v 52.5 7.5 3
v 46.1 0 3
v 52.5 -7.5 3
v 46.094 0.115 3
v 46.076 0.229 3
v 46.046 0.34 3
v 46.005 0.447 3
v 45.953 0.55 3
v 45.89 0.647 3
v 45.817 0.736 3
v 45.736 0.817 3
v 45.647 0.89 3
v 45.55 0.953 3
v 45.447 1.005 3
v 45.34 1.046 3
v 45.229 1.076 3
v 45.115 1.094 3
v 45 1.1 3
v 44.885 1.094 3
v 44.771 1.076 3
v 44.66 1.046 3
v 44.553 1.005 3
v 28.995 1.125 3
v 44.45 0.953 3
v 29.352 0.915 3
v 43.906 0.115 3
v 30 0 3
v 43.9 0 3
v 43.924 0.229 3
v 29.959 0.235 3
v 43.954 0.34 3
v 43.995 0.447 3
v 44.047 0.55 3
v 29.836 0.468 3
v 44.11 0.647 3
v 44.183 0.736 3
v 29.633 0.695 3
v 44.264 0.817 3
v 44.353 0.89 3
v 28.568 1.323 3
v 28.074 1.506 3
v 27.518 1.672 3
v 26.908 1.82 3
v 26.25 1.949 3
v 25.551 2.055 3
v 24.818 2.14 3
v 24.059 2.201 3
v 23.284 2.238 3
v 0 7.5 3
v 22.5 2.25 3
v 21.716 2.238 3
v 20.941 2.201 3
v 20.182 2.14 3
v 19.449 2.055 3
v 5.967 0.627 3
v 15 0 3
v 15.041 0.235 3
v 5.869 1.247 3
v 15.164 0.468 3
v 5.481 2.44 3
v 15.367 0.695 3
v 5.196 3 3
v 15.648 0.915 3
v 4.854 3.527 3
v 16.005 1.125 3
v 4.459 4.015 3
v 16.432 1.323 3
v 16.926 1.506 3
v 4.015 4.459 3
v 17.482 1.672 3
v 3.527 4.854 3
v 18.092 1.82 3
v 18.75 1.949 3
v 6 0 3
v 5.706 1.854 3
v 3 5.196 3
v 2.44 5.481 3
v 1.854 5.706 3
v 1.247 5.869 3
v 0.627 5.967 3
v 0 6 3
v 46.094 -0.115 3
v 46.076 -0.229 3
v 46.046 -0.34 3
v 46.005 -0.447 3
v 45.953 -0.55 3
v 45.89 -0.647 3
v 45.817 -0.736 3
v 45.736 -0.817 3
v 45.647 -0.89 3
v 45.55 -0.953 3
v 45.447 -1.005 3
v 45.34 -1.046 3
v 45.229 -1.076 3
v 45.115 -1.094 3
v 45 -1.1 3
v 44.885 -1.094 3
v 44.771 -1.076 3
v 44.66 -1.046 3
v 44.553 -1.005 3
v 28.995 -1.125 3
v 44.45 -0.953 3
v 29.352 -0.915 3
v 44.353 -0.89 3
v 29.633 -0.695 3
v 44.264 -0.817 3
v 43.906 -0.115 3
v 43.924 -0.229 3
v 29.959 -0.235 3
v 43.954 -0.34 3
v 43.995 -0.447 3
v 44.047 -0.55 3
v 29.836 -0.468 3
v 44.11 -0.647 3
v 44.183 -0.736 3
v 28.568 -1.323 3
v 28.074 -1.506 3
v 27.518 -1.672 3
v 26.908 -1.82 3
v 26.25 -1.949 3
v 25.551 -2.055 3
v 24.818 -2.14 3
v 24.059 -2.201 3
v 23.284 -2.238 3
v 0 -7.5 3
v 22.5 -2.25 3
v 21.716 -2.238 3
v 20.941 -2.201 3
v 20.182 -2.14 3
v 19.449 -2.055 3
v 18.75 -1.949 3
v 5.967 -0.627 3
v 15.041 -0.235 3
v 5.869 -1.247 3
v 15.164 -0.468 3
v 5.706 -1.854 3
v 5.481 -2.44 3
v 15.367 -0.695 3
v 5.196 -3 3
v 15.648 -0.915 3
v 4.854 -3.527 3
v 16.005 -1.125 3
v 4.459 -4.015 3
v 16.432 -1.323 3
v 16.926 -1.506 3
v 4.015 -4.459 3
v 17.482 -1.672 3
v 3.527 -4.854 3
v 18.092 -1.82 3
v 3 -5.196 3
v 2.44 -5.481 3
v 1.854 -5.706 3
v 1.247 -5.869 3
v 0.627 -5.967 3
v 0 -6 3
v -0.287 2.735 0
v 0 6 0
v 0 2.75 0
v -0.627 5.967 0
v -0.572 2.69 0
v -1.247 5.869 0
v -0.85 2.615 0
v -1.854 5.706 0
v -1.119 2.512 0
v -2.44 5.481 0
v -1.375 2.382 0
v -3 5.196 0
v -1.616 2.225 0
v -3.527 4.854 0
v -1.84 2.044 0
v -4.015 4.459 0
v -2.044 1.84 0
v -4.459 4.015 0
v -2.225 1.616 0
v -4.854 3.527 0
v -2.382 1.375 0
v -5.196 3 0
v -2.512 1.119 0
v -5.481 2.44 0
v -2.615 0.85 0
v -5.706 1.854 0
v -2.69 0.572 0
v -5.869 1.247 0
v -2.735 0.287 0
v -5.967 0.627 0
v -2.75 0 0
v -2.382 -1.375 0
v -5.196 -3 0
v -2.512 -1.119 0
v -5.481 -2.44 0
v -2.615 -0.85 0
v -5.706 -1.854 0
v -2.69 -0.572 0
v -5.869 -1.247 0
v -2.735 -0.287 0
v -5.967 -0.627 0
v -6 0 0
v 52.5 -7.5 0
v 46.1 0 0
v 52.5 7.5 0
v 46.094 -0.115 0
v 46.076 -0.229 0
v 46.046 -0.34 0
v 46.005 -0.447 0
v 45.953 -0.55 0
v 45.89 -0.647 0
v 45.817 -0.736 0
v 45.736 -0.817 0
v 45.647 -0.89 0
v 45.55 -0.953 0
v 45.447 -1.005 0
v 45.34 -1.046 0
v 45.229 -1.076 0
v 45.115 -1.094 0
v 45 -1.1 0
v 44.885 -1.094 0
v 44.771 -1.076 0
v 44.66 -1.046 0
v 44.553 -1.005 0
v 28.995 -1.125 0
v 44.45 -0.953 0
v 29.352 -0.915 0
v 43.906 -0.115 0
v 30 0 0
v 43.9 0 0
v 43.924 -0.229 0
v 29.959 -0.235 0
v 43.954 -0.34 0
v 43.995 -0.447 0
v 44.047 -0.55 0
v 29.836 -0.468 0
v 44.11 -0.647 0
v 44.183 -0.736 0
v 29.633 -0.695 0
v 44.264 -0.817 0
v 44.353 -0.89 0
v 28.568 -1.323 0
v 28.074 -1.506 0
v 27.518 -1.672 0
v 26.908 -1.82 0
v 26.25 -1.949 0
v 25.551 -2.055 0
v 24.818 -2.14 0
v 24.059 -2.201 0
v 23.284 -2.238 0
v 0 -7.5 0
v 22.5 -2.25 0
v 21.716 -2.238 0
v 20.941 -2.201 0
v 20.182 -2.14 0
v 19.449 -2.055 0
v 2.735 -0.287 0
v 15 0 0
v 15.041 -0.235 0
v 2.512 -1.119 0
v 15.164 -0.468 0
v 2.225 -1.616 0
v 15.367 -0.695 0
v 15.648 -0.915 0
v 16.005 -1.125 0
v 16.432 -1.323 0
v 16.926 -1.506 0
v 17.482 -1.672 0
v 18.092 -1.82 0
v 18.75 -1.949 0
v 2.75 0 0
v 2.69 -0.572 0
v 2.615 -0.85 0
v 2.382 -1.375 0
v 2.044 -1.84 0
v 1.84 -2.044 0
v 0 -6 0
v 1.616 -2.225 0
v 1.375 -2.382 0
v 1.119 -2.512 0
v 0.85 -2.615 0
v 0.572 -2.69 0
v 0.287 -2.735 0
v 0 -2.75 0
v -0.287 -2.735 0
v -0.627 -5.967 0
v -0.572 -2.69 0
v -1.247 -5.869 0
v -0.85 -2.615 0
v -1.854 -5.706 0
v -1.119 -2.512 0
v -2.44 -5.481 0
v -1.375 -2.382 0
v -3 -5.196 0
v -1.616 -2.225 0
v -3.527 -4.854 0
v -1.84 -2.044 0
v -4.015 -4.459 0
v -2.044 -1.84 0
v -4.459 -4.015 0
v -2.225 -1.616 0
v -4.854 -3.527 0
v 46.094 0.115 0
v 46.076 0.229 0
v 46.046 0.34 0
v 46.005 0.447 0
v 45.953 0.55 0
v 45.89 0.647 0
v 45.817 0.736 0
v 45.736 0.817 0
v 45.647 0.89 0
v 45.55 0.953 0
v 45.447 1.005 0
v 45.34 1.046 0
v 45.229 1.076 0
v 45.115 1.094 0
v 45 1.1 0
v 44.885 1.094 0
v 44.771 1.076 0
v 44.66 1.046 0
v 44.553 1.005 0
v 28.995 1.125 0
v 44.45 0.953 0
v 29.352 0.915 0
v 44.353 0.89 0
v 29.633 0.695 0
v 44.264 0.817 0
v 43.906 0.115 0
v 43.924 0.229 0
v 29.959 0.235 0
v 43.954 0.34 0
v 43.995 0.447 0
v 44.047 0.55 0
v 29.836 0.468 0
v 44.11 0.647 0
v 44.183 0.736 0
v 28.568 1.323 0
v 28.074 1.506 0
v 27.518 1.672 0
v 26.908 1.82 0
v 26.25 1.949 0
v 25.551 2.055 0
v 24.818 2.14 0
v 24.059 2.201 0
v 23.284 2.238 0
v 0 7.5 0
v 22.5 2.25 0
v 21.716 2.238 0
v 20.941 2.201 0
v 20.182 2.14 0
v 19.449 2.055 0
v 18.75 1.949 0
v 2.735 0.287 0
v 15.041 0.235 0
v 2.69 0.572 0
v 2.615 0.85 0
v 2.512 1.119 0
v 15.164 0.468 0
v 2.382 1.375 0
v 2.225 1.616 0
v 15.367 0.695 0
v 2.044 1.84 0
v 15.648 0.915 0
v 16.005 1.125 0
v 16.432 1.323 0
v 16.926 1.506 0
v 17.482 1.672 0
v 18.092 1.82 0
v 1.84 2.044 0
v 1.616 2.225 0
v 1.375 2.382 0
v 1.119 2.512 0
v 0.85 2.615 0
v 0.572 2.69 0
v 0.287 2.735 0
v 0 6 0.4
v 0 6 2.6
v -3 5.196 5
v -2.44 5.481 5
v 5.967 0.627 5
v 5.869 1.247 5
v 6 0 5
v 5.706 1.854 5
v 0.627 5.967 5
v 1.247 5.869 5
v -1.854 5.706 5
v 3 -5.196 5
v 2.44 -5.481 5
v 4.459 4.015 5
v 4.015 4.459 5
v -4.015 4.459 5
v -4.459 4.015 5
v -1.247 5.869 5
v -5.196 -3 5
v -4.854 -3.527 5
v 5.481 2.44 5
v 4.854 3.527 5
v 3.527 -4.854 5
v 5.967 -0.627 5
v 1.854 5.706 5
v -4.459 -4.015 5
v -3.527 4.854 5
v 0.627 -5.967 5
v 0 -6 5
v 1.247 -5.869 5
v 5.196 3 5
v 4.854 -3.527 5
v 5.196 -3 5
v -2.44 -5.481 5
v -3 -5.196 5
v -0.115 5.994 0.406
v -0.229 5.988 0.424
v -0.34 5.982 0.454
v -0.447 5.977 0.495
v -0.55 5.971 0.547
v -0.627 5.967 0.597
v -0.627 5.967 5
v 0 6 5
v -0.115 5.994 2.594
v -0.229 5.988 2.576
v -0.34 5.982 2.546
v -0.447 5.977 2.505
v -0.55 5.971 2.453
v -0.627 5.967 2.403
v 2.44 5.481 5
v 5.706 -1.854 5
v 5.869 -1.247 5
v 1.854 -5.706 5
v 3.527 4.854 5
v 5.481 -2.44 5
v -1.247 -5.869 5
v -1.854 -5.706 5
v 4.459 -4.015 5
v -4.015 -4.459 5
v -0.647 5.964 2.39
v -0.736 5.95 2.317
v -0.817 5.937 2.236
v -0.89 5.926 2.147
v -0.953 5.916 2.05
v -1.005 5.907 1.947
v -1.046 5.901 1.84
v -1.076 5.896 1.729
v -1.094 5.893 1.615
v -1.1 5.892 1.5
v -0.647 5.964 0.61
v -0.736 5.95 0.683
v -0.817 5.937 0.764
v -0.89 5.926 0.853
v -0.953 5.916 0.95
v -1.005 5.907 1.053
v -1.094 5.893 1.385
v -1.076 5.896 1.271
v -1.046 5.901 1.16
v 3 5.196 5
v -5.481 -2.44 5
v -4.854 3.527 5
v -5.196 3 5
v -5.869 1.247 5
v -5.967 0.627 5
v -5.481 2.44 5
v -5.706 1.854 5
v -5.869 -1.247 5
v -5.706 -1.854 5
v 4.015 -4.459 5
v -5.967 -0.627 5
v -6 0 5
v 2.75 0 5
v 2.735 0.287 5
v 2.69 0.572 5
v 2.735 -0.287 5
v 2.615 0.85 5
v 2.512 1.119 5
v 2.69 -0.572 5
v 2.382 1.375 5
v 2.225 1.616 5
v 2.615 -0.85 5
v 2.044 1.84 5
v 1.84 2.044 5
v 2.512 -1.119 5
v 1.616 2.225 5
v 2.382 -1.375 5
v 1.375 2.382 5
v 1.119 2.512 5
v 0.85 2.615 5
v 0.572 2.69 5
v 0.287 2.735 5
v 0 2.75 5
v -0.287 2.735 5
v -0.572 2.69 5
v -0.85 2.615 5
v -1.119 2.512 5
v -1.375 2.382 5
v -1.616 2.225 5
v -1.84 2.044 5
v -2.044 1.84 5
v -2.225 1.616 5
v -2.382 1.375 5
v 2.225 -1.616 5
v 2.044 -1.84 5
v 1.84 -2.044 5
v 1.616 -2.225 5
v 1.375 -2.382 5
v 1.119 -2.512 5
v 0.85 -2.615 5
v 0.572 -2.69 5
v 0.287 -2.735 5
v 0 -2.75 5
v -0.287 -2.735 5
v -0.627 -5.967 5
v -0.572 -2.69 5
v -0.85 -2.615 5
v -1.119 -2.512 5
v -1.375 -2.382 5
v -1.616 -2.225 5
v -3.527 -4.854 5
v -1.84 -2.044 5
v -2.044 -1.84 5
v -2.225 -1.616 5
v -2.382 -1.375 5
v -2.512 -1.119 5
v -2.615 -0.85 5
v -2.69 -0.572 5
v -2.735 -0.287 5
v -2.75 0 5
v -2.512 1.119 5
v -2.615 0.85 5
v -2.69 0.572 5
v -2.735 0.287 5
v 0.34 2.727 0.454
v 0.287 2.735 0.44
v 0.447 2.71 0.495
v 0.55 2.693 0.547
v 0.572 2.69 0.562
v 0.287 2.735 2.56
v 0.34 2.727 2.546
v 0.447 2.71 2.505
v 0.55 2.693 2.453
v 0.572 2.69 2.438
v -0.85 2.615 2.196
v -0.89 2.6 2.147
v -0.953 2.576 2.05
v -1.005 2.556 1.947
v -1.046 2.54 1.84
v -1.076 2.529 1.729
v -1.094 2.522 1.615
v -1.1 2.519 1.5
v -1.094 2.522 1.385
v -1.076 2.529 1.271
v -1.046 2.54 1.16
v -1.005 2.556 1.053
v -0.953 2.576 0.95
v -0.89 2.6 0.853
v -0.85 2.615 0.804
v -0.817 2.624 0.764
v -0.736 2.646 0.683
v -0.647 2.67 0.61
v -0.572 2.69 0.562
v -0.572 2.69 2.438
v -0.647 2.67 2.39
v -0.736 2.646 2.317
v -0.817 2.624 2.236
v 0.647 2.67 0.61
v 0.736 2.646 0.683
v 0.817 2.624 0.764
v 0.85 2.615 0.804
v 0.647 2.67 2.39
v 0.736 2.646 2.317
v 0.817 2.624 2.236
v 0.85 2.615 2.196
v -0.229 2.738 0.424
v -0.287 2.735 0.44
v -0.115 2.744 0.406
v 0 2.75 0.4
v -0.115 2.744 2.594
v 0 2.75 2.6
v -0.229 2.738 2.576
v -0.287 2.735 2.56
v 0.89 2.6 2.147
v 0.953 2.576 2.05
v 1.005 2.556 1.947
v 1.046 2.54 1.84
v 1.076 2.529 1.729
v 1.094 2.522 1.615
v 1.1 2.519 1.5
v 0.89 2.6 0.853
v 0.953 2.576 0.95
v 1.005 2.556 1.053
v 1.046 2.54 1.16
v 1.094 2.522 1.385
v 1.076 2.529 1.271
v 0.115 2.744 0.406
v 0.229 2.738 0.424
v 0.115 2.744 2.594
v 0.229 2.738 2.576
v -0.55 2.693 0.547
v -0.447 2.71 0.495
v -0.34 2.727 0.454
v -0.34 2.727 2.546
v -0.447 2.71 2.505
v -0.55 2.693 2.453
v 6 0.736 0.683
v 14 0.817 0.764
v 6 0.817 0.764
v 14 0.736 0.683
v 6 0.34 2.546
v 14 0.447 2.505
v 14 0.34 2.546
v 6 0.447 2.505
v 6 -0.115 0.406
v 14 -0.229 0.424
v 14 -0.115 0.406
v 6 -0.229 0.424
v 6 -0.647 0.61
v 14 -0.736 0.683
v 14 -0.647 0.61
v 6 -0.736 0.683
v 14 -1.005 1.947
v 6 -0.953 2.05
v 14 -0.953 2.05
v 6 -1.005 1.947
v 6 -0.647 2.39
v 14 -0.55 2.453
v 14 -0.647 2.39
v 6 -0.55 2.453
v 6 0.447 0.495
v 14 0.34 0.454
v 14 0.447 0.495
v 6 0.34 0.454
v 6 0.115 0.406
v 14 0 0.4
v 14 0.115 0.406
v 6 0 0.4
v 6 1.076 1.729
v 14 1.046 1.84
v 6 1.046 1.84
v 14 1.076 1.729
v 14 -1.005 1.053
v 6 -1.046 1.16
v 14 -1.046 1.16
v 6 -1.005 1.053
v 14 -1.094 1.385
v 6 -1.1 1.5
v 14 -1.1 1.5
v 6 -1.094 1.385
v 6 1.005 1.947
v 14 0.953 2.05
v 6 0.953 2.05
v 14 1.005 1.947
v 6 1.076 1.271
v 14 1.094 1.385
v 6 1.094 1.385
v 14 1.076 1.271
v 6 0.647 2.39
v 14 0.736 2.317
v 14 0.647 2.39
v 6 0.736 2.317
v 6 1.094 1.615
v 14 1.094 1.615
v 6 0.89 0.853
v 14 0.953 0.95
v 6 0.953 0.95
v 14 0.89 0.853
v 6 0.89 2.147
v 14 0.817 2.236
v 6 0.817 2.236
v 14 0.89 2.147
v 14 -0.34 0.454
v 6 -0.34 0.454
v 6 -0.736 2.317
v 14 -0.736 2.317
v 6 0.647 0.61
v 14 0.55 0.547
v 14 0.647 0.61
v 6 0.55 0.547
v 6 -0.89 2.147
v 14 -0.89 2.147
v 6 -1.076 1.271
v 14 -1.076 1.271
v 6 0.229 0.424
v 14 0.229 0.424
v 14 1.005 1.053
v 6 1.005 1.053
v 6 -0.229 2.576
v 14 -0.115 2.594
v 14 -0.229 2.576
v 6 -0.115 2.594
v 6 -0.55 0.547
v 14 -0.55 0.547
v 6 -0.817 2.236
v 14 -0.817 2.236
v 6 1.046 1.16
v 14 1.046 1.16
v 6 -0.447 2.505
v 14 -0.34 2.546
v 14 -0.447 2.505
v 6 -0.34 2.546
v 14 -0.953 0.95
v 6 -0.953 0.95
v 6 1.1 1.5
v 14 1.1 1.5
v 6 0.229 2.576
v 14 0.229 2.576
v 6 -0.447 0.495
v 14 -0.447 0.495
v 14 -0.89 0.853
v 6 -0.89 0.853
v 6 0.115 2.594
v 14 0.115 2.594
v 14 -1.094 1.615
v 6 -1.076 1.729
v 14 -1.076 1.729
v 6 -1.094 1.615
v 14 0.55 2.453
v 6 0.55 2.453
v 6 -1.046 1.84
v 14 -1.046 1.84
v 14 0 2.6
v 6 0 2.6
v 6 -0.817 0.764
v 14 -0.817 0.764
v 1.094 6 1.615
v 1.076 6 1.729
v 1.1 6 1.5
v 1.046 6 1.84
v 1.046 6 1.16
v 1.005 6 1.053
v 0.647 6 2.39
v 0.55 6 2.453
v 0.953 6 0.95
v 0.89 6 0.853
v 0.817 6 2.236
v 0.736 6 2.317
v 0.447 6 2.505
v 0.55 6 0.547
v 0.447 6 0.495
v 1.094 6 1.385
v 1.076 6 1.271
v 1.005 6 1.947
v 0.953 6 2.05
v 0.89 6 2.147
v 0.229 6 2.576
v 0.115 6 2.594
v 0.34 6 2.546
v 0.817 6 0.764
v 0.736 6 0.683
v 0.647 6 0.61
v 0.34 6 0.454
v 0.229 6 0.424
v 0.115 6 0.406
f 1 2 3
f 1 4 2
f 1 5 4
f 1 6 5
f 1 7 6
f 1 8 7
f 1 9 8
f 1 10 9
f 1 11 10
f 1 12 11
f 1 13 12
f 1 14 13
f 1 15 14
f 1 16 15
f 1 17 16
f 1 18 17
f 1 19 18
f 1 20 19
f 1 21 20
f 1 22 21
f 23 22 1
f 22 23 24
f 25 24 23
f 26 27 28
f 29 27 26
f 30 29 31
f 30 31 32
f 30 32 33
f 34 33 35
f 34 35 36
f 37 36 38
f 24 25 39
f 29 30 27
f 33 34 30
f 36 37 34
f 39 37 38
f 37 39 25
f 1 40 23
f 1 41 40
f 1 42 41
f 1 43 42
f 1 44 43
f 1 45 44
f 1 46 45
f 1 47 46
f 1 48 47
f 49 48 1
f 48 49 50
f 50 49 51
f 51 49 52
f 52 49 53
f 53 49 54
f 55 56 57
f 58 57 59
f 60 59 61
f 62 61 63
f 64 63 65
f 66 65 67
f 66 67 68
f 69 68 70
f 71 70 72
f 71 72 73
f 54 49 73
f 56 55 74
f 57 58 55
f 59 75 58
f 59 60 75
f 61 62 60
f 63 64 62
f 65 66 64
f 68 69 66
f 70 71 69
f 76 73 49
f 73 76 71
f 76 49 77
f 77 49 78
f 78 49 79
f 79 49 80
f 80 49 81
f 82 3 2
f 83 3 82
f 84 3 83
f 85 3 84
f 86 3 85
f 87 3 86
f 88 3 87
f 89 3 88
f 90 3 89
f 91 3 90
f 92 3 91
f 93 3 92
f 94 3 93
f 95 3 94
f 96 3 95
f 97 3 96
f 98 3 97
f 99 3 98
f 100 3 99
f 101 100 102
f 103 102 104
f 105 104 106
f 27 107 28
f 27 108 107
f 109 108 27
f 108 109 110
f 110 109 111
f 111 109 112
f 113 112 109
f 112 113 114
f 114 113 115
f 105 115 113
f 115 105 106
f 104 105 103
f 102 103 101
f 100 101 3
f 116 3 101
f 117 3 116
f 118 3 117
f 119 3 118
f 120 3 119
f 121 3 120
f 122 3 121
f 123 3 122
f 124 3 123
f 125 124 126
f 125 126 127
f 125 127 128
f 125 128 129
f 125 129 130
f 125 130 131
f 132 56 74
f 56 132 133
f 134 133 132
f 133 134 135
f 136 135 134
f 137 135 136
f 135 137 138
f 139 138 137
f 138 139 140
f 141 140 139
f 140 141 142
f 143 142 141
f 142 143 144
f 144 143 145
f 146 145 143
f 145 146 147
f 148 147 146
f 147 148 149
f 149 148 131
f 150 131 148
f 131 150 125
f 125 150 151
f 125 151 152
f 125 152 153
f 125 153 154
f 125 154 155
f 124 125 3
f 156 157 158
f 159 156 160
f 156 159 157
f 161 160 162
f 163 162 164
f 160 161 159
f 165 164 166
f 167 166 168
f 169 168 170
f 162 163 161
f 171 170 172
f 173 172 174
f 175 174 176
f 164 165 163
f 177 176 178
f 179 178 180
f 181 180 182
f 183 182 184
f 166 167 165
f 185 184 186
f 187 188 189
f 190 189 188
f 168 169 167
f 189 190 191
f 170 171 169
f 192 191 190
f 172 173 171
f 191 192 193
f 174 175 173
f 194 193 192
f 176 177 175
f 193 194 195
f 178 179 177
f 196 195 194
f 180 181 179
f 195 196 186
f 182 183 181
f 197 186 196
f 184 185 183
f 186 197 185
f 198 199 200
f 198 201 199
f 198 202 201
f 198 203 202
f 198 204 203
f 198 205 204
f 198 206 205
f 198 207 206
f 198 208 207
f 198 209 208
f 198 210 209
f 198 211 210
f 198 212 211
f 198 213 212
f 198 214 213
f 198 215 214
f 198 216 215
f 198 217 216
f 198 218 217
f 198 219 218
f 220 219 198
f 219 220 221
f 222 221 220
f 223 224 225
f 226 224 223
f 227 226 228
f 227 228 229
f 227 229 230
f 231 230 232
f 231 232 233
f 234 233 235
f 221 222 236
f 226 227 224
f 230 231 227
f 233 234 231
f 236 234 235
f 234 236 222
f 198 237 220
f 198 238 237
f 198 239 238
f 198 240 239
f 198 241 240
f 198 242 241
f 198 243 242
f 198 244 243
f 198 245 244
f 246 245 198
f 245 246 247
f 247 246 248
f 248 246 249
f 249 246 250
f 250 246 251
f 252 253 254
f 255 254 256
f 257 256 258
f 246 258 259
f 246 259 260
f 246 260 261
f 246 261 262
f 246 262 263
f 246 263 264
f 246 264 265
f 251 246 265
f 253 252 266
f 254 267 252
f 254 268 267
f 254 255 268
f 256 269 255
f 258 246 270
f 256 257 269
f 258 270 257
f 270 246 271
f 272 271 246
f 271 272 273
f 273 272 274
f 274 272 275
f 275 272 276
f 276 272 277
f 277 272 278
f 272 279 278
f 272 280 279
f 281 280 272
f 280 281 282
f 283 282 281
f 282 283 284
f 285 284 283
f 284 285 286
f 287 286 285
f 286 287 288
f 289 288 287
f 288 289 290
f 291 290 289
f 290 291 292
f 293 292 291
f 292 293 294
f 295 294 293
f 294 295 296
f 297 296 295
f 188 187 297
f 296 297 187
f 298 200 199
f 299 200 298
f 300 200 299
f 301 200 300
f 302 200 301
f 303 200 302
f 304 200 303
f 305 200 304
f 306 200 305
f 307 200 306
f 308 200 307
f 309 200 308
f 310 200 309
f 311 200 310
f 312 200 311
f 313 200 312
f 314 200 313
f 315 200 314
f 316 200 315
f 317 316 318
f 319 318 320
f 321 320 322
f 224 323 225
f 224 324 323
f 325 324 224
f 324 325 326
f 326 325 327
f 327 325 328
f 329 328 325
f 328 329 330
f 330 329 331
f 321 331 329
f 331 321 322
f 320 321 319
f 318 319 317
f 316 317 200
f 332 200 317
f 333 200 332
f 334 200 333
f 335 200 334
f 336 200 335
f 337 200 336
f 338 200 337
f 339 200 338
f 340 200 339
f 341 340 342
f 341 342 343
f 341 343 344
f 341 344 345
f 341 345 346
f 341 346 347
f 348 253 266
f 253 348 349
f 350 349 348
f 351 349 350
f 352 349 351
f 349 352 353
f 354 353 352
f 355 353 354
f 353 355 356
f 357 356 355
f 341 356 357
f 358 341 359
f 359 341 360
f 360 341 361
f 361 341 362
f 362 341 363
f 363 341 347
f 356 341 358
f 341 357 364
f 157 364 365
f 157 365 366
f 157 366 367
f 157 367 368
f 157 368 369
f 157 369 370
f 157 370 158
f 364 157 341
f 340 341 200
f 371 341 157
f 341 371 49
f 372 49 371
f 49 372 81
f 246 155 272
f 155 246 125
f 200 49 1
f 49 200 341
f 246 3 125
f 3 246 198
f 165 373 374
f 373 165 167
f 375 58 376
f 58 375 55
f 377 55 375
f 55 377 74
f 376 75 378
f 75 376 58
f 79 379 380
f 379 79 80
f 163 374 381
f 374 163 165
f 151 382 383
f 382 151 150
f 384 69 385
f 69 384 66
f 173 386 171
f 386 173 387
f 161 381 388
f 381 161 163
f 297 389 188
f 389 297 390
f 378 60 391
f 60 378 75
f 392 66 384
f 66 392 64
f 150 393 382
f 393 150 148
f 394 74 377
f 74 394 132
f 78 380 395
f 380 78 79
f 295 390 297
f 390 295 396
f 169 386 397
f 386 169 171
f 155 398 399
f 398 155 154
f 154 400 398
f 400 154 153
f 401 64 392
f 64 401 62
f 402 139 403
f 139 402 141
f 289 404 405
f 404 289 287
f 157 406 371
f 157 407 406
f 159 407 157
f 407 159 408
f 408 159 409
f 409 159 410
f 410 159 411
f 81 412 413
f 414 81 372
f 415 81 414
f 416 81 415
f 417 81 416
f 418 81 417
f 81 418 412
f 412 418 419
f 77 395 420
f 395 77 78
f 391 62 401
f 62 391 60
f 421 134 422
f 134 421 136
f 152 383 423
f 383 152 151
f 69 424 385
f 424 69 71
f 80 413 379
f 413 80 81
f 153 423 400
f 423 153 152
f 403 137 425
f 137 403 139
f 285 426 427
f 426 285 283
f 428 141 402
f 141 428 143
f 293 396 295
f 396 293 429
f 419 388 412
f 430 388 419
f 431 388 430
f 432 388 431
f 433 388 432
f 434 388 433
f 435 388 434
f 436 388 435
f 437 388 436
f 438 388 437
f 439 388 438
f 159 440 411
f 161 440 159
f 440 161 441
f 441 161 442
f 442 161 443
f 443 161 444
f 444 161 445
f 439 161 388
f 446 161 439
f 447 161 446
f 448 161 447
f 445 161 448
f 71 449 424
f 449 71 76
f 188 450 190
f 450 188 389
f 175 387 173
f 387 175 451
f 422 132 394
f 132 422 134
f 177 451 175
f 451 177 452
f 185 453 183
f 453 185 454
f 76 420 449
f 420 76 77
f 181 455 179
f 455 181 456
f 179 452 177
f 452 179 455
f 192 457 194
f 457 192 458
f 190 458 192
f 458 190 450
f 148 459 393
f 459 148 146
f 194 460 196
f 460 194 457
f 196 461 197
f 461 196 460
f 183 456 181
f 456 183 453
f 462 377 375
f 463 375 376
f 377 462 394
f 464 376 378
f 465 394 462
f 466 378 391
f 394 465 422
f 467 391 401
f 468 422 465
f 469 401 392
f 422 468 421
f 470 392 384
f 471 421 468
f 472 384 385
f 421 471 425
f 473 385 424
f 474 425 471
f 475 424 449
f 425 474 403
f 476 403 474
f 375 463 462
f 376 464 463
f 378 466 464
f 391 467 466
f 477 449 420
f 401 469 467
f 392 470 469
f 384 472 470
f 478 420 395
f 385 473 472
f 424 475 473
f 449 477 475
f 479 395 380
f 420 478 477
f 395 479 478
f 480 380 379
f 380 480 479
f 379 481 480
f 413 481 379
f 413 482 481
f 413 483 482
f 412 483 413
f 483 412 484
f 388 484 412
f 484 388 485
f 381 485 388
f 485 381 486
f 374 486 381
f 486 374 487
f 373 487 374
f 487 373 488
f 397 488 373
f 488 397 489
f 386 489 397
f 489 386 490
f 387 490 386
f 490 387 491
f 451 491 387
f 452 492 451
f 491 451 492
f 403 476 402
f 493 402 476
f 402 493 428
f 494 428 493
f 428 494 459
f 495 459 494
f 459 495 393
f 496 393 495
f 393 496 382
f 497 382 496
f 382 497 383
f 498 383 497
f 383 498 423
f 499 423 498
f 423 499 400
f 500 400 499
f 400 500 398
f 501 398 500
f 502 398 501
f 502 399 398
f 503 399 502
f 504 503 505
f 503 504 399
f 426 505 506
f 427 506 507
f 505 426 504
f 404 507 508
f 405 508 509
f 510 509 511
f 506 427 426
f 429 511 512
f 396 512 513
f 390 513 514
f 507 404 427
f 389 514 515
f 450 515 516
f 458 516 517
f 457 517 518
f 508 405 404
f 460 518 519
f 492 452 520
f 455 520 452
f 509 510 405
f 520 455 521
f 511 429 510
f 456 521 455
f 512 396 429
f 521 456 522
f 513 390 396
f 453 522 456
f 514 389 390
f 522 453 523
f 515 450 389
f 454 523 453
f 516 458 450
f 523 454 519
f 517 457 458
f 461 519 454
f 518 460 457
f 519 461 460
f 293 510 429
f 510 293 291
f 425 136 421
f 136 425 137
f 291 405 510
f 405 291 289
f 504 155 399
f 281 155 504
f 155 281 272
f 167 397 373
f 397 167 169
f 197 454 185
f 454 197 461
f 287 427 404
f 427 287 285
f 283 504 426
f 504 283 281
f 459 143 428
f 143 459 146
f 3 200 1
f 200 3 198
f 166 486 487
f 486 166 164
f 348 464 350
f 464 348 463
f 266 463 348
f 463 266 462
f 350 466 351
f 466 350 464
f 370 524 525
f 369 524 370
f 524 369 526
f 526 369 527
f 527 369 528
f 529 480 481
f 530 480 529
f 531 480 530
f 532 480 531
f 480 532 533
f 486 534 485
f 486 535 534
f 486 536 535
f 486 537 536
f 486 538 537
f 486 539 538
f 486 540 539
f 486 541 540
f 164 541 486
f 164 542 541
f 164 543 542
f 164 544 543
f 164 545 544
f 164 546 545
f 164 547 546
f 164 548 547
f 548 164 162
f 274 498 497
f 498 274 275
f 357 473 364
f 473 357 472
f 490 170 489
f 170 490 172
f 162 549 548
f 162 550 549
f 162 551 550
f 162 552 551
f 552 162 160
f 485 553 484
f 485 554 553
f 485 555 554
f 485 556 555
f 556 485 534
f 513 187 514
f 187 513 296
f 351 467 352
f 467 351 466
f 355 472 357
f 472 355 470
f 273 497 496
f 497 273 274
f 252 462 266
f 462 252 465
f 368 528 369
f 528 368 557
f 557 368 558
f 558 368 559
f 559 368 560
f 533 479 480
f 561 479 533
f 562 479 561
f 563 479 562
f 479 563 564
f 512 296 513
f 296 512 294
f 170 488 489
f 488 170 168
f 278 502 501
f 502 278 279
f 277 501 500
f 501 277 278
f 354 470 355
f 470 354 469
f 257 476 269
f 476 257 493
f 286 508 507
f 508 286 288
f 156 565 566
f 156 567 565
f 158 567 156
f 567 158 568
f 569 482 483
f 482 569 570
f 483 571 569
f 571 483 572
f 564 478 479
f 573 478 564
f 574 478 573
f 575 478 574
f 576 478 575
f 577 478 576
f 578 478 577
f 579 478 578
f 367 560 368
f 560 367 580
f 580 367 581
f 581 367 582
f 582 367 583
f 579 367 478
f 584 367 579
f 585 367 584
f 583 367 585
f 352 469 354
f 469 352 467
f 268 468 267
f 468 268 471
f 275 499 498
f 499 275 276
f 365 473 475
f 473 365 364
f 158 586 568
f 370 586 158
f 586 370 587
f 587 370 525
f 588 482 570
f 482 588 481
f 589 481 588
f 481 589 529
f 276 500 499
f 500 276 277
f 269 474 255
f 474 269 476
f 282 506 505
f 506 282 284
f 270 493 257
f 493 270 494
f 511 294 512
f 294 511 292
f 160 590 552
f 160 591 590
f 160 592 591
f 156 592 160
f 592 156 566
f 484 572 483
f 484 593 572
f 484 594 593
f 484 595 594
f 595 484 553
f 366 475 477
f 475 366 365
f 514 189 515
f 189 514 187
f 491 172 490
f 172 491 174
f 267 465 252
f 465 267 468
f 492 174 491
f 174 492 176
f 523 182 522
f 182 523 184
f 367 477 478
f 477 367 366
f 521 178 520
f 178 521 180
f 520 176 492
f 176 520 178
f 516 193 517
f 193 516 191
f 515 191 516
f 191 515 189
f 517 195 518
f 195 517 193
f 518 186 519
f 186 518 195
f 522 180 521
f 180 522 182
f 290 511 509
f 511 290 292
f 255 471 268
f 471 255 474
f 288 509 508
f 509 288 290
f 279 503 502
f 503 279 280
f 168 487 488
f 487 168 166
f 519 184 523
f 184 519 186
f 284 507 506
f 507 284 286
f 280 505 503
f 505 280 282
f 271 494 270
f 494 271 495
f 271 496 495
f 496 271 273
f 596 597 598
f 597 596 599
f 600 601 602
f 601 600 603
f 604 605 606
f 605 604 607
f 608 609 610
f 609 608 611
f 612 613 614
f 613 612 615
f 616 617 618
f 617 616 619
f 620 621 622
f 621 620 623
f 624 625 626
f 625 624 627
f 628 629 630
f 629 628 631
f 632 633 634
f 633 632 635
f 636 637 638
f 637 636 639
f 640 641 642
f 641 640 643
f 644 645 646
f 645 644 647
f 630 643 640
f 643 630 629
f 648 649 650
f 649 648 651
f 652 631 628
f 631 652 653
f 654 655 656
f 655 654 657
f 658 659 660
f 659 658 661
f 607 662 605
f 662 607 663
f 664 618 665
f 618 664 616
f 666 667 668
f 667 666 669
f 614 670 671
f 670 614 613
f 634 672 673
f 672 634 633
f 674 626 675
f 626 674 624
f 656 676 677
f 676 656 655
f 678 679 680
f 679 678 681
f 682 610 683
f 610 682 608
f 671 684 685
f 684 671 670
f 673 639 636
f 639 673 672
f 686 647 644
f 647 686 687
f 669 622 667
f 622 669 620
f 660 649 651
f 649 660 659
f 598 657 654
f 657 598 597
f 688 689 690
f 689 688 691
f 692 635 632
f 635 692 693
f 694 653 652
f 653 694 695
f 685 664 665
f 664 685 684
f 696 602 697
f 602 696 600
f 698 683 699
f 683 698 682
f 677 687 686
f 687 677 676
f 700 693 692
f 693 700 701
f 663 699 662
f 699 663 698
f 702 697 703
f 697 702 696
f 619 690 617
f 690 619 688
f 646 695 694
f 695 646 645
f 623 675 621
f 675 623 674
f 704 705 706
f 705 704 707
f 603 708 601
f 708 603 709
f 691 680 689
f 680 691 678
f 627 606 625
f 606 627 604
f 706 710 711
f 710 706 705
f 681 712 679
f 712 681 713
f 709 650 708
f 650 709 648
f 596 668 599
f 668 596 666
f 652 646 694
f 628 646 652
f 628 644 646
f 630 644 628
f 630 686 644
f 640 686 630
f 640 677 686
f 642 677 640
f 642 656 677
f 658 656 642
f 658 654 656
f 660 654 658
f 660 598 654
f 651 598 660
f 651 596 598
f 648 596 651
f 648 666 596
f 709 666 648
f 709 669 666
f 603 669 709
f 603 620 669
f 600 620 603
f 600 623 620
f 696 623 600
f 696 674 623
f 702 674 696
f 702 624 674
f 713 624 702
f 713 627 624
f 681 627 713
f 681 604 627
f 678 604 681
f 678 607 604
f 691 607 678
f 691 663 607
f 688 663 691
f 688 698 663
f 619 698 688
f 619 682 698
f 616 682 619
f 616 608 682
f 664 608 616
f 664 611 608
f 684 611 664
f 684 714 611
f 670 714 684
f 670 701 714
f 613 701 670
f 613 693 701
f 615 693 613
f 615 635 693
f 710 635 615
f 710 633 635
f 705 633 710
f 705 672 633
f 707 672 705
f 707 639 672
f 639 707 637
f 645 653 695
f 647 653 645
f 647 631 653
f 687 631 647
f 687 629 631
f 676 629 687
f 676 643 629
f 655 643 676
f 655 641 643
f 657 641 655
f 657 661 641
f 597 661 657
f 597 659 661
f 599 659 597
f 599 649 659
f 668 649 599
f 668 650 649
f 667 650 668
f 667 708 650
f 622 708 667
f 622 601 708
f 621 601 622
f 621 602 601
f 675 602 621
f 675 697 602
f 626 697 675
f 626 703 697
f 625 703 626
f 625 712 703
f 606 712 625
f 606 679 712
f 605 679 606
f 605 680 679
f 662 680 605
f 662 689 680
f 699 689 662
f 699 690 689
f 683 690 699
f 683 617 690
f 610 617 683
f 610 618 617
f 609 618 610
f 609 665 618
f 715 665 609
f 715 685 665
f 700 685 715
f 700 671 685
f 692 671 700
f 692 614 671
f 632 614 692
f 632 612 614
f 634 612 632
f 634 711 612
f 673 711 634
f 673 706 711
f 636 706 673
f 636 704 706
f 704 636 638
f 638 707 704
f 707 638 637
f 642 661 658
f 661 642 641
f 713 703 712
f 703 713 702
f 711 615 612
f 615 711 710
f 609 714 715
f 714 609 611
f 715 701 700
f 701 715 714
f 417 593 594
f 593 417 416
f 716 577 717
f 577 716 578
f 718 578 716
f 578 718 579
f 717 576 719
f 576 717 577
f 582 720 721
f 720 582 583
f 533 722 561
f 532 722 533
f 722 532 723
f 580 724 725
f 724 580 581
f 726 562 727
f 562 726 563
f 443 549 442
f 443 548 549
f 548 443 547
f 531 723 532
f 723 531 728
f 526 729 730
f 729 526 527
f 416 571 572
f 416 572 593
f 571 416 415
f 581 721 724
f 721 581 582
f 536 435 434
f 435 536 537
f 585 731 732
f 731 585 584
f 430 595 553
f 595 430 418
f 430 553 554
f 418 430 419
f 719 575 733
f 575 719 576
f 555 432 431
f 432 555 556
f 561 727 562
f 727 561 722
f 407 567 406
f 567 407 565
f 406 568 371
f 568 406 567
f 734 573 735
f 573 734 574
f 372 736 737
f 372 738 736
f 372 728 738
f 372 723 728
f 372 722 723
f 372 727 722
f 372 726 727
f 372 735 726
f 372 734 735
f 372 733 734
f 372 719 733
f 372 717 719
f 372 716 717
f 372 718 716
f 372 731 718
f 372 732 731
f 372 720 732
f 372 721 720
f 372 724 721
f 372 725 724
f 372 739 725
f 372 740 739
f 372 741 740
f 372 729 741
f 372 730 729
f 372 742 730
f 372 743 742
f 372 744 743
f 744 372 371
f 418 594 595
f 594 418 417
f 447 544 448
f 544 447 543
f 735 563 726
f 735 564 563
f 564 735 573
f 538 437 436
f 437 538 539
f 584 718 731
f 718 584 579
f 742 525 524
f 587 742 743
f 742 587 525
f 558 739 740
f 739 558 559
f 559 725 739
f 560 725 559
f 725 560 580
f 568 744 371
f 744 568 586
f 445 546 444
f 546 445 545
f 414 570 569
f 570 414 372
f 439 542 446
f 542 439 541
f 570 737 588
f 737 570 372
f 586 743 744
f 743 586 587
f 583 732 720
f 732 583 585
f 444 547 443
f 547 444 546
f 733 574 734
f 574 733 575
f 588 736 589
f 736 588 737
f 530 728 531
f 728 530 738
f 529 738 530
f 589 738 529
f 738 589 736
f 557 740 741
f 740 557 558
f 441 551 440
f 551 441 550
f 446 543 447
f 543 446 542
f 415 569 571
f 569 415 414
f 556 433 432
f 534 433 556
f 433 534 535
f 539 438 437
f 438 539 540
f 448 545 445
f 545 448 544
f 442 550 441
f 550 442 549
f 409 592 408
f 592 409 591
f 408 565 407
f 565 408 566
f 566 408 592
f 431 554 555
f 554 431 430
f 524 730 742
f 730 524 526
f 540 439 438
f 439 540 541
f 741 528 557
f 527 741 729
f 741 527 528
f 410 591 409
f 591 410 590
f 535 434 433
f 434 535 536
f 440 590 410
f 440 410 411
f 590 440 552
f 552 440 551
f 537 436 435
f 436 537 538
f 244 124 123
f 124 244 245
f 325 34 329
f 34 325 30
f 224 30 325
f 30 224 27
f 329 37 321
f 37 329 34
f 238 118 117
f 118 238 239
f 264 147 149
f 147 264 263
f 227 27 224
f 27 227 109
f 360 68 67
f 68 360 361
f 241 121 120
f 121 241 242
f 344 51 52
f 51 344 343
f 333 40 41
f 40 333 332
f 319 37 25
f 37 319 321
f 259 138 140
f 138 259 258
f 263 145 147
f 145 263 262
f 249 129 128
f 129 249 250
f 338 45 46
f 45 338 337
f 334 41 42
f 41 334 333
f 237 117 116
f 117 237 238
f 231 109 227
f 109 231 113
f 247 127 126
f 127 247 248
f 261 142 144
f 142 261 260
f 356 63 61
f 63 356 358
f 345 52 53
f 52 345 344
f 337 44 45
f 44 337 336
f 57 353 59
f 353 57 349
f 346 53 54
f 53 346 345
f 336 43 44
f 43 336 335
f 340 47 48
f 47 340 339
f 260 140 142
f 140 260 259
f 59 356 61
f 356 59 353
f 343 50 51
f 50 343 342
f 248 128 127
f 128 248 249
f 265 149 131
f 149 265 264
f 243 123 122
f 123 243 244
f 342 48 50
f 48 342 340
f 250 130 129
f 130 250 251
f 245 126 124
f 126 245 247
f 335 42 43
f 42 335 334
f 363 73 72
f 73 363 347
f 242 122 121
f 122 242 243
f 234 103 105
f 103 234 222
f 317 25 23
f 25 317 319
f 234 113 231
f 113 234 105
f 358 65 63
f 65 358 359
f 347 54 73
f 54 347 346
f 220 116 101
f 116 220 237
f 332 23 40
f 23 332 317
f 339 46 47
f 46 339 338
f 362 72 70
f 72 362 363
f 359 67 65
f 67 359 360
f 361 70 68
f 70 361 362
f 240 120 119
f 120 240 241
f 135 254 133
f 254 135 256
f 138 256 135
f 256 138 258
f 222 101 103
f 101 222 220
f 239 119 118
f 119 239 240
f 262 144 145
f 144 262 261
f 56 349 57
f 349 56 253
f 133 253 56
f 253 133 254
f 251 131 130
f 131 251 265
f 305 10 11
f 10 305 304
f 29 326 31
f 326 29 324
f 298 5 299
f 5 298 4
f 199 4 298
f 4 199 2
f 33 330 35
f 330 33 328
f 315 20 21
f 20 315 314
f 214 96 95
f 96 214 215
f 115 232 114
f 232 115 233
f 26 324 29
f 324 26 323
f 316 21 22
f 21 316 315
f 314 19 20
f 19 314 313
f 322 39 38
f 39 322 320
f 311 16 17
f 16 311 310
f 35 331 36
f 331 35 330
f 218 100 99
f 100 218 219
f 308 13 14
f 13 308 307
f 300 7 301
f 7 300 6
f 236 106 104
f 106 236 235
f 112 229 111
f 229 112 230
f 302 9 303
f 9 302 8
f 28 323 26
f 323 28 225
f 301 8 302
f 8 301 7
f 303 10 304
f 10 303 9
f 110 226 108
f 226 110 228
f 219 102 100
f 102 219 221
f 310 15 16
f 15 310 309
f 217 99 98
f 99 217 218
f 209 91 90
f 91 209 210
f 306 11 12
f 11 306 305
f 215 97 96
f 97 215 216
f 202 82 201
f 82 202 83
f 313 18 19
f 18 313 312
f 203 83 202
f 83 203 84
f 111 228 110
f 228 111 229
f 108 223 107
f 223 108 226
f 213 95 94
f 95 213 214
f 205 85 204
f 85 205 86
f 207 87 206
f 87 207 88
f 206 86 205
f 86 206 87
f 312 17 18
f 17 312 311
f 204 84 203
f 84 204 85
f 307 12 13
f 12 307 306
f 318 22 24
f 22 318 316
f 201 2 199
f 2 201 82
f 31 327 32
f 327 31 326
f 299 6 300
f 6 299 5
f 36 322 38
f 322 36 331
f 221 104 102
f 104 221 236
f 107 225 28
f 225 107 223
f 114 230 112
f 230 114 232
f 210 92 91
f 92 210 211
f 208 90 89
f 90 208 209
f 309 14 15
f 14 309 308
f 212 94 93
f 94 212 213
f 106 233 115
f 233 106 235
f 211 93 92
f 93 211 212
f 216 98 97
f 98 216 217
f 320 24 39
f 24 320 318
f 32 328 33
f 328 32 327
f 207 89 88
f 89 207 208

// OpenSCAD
// ============================================================================
// P5_Lower_Arm_Link
// ============================================================================
// SeaBreeze-Inspector 3DOF 机械臂 — 3D打印零件
// 参数与代码完全吻合: L1=55, L2=45, L3=35, base_height=25
// 生成日期: 2026
// ============================================================================

$fn = 60;

L1 = 55;
L2 = 45;
L3 = 35;
BASE_H = 25;

// SG90 舵机参数 (mm)
SG90_BODY_W = 22.2;
SG90_BODY_H = 11.8;
SG90_BODY_L = 31.0;
SG90_AXIS_H = 26.5;
SG90_AXIS_D = 4.8;
SG90_EAR_HOLE_D = 2.0;
SG90_EAR_SPAN_X = 10.0;
SG90_EAR_SPAN_Y = 22.5;

// 紧固件
M2_D = 2.2;
M2p5_D = 2.7;
M3_D = 3.2;

// 打印参数
WALL = 2.0;
LINK_W = 15.0;
LINK_T = 3.0;


ARM_L = L2; ARM_W = LINK_W; ARM_T = LINK_T;
AXIS_HOLE_D = 5.5; SET_SCREW_D = M2_D;
FLANGE_W = 15; FLANGE_D = 15;

module lower_arm_link() {
    difference() {
        union() {
            translate([ARM_L/2, 0, ARM_T/2])
                cube([ARM_L, ARM_W, ARM_T], center=true);
            cylinder(h=ARM_T + 2, d=12);
            translate([ARM_L, 0, ARM_T/2])
                cube([FLANGE_D, FLANGE_W, ARM_T], center=true);
        }
        translate([0, 0, -1])
            cylinder(h=ARM_T+4, d=AXIS_HOLE_D);
        translate([6, 0, ARM_T/2])
            rotate([0, 90, 0]) cylinder(h=8, d=SET_SCREW_D);
        translate([0, 6, ARM_T/2])
            rotate([90, 0, 0]) cylinder(h=8, d=SET_SCREW_D);
        translate([ARM_L/2, 0, -1])
            scale([2, 0.6, 1])
            cylinder(h=ARM_T+2, d=ARM_W * 0.5);
        translate([ARM_L, 0, -1])
            cylinder(h=ARM_T+2, d=M2_D);
    }
}
lower_arm_link();
